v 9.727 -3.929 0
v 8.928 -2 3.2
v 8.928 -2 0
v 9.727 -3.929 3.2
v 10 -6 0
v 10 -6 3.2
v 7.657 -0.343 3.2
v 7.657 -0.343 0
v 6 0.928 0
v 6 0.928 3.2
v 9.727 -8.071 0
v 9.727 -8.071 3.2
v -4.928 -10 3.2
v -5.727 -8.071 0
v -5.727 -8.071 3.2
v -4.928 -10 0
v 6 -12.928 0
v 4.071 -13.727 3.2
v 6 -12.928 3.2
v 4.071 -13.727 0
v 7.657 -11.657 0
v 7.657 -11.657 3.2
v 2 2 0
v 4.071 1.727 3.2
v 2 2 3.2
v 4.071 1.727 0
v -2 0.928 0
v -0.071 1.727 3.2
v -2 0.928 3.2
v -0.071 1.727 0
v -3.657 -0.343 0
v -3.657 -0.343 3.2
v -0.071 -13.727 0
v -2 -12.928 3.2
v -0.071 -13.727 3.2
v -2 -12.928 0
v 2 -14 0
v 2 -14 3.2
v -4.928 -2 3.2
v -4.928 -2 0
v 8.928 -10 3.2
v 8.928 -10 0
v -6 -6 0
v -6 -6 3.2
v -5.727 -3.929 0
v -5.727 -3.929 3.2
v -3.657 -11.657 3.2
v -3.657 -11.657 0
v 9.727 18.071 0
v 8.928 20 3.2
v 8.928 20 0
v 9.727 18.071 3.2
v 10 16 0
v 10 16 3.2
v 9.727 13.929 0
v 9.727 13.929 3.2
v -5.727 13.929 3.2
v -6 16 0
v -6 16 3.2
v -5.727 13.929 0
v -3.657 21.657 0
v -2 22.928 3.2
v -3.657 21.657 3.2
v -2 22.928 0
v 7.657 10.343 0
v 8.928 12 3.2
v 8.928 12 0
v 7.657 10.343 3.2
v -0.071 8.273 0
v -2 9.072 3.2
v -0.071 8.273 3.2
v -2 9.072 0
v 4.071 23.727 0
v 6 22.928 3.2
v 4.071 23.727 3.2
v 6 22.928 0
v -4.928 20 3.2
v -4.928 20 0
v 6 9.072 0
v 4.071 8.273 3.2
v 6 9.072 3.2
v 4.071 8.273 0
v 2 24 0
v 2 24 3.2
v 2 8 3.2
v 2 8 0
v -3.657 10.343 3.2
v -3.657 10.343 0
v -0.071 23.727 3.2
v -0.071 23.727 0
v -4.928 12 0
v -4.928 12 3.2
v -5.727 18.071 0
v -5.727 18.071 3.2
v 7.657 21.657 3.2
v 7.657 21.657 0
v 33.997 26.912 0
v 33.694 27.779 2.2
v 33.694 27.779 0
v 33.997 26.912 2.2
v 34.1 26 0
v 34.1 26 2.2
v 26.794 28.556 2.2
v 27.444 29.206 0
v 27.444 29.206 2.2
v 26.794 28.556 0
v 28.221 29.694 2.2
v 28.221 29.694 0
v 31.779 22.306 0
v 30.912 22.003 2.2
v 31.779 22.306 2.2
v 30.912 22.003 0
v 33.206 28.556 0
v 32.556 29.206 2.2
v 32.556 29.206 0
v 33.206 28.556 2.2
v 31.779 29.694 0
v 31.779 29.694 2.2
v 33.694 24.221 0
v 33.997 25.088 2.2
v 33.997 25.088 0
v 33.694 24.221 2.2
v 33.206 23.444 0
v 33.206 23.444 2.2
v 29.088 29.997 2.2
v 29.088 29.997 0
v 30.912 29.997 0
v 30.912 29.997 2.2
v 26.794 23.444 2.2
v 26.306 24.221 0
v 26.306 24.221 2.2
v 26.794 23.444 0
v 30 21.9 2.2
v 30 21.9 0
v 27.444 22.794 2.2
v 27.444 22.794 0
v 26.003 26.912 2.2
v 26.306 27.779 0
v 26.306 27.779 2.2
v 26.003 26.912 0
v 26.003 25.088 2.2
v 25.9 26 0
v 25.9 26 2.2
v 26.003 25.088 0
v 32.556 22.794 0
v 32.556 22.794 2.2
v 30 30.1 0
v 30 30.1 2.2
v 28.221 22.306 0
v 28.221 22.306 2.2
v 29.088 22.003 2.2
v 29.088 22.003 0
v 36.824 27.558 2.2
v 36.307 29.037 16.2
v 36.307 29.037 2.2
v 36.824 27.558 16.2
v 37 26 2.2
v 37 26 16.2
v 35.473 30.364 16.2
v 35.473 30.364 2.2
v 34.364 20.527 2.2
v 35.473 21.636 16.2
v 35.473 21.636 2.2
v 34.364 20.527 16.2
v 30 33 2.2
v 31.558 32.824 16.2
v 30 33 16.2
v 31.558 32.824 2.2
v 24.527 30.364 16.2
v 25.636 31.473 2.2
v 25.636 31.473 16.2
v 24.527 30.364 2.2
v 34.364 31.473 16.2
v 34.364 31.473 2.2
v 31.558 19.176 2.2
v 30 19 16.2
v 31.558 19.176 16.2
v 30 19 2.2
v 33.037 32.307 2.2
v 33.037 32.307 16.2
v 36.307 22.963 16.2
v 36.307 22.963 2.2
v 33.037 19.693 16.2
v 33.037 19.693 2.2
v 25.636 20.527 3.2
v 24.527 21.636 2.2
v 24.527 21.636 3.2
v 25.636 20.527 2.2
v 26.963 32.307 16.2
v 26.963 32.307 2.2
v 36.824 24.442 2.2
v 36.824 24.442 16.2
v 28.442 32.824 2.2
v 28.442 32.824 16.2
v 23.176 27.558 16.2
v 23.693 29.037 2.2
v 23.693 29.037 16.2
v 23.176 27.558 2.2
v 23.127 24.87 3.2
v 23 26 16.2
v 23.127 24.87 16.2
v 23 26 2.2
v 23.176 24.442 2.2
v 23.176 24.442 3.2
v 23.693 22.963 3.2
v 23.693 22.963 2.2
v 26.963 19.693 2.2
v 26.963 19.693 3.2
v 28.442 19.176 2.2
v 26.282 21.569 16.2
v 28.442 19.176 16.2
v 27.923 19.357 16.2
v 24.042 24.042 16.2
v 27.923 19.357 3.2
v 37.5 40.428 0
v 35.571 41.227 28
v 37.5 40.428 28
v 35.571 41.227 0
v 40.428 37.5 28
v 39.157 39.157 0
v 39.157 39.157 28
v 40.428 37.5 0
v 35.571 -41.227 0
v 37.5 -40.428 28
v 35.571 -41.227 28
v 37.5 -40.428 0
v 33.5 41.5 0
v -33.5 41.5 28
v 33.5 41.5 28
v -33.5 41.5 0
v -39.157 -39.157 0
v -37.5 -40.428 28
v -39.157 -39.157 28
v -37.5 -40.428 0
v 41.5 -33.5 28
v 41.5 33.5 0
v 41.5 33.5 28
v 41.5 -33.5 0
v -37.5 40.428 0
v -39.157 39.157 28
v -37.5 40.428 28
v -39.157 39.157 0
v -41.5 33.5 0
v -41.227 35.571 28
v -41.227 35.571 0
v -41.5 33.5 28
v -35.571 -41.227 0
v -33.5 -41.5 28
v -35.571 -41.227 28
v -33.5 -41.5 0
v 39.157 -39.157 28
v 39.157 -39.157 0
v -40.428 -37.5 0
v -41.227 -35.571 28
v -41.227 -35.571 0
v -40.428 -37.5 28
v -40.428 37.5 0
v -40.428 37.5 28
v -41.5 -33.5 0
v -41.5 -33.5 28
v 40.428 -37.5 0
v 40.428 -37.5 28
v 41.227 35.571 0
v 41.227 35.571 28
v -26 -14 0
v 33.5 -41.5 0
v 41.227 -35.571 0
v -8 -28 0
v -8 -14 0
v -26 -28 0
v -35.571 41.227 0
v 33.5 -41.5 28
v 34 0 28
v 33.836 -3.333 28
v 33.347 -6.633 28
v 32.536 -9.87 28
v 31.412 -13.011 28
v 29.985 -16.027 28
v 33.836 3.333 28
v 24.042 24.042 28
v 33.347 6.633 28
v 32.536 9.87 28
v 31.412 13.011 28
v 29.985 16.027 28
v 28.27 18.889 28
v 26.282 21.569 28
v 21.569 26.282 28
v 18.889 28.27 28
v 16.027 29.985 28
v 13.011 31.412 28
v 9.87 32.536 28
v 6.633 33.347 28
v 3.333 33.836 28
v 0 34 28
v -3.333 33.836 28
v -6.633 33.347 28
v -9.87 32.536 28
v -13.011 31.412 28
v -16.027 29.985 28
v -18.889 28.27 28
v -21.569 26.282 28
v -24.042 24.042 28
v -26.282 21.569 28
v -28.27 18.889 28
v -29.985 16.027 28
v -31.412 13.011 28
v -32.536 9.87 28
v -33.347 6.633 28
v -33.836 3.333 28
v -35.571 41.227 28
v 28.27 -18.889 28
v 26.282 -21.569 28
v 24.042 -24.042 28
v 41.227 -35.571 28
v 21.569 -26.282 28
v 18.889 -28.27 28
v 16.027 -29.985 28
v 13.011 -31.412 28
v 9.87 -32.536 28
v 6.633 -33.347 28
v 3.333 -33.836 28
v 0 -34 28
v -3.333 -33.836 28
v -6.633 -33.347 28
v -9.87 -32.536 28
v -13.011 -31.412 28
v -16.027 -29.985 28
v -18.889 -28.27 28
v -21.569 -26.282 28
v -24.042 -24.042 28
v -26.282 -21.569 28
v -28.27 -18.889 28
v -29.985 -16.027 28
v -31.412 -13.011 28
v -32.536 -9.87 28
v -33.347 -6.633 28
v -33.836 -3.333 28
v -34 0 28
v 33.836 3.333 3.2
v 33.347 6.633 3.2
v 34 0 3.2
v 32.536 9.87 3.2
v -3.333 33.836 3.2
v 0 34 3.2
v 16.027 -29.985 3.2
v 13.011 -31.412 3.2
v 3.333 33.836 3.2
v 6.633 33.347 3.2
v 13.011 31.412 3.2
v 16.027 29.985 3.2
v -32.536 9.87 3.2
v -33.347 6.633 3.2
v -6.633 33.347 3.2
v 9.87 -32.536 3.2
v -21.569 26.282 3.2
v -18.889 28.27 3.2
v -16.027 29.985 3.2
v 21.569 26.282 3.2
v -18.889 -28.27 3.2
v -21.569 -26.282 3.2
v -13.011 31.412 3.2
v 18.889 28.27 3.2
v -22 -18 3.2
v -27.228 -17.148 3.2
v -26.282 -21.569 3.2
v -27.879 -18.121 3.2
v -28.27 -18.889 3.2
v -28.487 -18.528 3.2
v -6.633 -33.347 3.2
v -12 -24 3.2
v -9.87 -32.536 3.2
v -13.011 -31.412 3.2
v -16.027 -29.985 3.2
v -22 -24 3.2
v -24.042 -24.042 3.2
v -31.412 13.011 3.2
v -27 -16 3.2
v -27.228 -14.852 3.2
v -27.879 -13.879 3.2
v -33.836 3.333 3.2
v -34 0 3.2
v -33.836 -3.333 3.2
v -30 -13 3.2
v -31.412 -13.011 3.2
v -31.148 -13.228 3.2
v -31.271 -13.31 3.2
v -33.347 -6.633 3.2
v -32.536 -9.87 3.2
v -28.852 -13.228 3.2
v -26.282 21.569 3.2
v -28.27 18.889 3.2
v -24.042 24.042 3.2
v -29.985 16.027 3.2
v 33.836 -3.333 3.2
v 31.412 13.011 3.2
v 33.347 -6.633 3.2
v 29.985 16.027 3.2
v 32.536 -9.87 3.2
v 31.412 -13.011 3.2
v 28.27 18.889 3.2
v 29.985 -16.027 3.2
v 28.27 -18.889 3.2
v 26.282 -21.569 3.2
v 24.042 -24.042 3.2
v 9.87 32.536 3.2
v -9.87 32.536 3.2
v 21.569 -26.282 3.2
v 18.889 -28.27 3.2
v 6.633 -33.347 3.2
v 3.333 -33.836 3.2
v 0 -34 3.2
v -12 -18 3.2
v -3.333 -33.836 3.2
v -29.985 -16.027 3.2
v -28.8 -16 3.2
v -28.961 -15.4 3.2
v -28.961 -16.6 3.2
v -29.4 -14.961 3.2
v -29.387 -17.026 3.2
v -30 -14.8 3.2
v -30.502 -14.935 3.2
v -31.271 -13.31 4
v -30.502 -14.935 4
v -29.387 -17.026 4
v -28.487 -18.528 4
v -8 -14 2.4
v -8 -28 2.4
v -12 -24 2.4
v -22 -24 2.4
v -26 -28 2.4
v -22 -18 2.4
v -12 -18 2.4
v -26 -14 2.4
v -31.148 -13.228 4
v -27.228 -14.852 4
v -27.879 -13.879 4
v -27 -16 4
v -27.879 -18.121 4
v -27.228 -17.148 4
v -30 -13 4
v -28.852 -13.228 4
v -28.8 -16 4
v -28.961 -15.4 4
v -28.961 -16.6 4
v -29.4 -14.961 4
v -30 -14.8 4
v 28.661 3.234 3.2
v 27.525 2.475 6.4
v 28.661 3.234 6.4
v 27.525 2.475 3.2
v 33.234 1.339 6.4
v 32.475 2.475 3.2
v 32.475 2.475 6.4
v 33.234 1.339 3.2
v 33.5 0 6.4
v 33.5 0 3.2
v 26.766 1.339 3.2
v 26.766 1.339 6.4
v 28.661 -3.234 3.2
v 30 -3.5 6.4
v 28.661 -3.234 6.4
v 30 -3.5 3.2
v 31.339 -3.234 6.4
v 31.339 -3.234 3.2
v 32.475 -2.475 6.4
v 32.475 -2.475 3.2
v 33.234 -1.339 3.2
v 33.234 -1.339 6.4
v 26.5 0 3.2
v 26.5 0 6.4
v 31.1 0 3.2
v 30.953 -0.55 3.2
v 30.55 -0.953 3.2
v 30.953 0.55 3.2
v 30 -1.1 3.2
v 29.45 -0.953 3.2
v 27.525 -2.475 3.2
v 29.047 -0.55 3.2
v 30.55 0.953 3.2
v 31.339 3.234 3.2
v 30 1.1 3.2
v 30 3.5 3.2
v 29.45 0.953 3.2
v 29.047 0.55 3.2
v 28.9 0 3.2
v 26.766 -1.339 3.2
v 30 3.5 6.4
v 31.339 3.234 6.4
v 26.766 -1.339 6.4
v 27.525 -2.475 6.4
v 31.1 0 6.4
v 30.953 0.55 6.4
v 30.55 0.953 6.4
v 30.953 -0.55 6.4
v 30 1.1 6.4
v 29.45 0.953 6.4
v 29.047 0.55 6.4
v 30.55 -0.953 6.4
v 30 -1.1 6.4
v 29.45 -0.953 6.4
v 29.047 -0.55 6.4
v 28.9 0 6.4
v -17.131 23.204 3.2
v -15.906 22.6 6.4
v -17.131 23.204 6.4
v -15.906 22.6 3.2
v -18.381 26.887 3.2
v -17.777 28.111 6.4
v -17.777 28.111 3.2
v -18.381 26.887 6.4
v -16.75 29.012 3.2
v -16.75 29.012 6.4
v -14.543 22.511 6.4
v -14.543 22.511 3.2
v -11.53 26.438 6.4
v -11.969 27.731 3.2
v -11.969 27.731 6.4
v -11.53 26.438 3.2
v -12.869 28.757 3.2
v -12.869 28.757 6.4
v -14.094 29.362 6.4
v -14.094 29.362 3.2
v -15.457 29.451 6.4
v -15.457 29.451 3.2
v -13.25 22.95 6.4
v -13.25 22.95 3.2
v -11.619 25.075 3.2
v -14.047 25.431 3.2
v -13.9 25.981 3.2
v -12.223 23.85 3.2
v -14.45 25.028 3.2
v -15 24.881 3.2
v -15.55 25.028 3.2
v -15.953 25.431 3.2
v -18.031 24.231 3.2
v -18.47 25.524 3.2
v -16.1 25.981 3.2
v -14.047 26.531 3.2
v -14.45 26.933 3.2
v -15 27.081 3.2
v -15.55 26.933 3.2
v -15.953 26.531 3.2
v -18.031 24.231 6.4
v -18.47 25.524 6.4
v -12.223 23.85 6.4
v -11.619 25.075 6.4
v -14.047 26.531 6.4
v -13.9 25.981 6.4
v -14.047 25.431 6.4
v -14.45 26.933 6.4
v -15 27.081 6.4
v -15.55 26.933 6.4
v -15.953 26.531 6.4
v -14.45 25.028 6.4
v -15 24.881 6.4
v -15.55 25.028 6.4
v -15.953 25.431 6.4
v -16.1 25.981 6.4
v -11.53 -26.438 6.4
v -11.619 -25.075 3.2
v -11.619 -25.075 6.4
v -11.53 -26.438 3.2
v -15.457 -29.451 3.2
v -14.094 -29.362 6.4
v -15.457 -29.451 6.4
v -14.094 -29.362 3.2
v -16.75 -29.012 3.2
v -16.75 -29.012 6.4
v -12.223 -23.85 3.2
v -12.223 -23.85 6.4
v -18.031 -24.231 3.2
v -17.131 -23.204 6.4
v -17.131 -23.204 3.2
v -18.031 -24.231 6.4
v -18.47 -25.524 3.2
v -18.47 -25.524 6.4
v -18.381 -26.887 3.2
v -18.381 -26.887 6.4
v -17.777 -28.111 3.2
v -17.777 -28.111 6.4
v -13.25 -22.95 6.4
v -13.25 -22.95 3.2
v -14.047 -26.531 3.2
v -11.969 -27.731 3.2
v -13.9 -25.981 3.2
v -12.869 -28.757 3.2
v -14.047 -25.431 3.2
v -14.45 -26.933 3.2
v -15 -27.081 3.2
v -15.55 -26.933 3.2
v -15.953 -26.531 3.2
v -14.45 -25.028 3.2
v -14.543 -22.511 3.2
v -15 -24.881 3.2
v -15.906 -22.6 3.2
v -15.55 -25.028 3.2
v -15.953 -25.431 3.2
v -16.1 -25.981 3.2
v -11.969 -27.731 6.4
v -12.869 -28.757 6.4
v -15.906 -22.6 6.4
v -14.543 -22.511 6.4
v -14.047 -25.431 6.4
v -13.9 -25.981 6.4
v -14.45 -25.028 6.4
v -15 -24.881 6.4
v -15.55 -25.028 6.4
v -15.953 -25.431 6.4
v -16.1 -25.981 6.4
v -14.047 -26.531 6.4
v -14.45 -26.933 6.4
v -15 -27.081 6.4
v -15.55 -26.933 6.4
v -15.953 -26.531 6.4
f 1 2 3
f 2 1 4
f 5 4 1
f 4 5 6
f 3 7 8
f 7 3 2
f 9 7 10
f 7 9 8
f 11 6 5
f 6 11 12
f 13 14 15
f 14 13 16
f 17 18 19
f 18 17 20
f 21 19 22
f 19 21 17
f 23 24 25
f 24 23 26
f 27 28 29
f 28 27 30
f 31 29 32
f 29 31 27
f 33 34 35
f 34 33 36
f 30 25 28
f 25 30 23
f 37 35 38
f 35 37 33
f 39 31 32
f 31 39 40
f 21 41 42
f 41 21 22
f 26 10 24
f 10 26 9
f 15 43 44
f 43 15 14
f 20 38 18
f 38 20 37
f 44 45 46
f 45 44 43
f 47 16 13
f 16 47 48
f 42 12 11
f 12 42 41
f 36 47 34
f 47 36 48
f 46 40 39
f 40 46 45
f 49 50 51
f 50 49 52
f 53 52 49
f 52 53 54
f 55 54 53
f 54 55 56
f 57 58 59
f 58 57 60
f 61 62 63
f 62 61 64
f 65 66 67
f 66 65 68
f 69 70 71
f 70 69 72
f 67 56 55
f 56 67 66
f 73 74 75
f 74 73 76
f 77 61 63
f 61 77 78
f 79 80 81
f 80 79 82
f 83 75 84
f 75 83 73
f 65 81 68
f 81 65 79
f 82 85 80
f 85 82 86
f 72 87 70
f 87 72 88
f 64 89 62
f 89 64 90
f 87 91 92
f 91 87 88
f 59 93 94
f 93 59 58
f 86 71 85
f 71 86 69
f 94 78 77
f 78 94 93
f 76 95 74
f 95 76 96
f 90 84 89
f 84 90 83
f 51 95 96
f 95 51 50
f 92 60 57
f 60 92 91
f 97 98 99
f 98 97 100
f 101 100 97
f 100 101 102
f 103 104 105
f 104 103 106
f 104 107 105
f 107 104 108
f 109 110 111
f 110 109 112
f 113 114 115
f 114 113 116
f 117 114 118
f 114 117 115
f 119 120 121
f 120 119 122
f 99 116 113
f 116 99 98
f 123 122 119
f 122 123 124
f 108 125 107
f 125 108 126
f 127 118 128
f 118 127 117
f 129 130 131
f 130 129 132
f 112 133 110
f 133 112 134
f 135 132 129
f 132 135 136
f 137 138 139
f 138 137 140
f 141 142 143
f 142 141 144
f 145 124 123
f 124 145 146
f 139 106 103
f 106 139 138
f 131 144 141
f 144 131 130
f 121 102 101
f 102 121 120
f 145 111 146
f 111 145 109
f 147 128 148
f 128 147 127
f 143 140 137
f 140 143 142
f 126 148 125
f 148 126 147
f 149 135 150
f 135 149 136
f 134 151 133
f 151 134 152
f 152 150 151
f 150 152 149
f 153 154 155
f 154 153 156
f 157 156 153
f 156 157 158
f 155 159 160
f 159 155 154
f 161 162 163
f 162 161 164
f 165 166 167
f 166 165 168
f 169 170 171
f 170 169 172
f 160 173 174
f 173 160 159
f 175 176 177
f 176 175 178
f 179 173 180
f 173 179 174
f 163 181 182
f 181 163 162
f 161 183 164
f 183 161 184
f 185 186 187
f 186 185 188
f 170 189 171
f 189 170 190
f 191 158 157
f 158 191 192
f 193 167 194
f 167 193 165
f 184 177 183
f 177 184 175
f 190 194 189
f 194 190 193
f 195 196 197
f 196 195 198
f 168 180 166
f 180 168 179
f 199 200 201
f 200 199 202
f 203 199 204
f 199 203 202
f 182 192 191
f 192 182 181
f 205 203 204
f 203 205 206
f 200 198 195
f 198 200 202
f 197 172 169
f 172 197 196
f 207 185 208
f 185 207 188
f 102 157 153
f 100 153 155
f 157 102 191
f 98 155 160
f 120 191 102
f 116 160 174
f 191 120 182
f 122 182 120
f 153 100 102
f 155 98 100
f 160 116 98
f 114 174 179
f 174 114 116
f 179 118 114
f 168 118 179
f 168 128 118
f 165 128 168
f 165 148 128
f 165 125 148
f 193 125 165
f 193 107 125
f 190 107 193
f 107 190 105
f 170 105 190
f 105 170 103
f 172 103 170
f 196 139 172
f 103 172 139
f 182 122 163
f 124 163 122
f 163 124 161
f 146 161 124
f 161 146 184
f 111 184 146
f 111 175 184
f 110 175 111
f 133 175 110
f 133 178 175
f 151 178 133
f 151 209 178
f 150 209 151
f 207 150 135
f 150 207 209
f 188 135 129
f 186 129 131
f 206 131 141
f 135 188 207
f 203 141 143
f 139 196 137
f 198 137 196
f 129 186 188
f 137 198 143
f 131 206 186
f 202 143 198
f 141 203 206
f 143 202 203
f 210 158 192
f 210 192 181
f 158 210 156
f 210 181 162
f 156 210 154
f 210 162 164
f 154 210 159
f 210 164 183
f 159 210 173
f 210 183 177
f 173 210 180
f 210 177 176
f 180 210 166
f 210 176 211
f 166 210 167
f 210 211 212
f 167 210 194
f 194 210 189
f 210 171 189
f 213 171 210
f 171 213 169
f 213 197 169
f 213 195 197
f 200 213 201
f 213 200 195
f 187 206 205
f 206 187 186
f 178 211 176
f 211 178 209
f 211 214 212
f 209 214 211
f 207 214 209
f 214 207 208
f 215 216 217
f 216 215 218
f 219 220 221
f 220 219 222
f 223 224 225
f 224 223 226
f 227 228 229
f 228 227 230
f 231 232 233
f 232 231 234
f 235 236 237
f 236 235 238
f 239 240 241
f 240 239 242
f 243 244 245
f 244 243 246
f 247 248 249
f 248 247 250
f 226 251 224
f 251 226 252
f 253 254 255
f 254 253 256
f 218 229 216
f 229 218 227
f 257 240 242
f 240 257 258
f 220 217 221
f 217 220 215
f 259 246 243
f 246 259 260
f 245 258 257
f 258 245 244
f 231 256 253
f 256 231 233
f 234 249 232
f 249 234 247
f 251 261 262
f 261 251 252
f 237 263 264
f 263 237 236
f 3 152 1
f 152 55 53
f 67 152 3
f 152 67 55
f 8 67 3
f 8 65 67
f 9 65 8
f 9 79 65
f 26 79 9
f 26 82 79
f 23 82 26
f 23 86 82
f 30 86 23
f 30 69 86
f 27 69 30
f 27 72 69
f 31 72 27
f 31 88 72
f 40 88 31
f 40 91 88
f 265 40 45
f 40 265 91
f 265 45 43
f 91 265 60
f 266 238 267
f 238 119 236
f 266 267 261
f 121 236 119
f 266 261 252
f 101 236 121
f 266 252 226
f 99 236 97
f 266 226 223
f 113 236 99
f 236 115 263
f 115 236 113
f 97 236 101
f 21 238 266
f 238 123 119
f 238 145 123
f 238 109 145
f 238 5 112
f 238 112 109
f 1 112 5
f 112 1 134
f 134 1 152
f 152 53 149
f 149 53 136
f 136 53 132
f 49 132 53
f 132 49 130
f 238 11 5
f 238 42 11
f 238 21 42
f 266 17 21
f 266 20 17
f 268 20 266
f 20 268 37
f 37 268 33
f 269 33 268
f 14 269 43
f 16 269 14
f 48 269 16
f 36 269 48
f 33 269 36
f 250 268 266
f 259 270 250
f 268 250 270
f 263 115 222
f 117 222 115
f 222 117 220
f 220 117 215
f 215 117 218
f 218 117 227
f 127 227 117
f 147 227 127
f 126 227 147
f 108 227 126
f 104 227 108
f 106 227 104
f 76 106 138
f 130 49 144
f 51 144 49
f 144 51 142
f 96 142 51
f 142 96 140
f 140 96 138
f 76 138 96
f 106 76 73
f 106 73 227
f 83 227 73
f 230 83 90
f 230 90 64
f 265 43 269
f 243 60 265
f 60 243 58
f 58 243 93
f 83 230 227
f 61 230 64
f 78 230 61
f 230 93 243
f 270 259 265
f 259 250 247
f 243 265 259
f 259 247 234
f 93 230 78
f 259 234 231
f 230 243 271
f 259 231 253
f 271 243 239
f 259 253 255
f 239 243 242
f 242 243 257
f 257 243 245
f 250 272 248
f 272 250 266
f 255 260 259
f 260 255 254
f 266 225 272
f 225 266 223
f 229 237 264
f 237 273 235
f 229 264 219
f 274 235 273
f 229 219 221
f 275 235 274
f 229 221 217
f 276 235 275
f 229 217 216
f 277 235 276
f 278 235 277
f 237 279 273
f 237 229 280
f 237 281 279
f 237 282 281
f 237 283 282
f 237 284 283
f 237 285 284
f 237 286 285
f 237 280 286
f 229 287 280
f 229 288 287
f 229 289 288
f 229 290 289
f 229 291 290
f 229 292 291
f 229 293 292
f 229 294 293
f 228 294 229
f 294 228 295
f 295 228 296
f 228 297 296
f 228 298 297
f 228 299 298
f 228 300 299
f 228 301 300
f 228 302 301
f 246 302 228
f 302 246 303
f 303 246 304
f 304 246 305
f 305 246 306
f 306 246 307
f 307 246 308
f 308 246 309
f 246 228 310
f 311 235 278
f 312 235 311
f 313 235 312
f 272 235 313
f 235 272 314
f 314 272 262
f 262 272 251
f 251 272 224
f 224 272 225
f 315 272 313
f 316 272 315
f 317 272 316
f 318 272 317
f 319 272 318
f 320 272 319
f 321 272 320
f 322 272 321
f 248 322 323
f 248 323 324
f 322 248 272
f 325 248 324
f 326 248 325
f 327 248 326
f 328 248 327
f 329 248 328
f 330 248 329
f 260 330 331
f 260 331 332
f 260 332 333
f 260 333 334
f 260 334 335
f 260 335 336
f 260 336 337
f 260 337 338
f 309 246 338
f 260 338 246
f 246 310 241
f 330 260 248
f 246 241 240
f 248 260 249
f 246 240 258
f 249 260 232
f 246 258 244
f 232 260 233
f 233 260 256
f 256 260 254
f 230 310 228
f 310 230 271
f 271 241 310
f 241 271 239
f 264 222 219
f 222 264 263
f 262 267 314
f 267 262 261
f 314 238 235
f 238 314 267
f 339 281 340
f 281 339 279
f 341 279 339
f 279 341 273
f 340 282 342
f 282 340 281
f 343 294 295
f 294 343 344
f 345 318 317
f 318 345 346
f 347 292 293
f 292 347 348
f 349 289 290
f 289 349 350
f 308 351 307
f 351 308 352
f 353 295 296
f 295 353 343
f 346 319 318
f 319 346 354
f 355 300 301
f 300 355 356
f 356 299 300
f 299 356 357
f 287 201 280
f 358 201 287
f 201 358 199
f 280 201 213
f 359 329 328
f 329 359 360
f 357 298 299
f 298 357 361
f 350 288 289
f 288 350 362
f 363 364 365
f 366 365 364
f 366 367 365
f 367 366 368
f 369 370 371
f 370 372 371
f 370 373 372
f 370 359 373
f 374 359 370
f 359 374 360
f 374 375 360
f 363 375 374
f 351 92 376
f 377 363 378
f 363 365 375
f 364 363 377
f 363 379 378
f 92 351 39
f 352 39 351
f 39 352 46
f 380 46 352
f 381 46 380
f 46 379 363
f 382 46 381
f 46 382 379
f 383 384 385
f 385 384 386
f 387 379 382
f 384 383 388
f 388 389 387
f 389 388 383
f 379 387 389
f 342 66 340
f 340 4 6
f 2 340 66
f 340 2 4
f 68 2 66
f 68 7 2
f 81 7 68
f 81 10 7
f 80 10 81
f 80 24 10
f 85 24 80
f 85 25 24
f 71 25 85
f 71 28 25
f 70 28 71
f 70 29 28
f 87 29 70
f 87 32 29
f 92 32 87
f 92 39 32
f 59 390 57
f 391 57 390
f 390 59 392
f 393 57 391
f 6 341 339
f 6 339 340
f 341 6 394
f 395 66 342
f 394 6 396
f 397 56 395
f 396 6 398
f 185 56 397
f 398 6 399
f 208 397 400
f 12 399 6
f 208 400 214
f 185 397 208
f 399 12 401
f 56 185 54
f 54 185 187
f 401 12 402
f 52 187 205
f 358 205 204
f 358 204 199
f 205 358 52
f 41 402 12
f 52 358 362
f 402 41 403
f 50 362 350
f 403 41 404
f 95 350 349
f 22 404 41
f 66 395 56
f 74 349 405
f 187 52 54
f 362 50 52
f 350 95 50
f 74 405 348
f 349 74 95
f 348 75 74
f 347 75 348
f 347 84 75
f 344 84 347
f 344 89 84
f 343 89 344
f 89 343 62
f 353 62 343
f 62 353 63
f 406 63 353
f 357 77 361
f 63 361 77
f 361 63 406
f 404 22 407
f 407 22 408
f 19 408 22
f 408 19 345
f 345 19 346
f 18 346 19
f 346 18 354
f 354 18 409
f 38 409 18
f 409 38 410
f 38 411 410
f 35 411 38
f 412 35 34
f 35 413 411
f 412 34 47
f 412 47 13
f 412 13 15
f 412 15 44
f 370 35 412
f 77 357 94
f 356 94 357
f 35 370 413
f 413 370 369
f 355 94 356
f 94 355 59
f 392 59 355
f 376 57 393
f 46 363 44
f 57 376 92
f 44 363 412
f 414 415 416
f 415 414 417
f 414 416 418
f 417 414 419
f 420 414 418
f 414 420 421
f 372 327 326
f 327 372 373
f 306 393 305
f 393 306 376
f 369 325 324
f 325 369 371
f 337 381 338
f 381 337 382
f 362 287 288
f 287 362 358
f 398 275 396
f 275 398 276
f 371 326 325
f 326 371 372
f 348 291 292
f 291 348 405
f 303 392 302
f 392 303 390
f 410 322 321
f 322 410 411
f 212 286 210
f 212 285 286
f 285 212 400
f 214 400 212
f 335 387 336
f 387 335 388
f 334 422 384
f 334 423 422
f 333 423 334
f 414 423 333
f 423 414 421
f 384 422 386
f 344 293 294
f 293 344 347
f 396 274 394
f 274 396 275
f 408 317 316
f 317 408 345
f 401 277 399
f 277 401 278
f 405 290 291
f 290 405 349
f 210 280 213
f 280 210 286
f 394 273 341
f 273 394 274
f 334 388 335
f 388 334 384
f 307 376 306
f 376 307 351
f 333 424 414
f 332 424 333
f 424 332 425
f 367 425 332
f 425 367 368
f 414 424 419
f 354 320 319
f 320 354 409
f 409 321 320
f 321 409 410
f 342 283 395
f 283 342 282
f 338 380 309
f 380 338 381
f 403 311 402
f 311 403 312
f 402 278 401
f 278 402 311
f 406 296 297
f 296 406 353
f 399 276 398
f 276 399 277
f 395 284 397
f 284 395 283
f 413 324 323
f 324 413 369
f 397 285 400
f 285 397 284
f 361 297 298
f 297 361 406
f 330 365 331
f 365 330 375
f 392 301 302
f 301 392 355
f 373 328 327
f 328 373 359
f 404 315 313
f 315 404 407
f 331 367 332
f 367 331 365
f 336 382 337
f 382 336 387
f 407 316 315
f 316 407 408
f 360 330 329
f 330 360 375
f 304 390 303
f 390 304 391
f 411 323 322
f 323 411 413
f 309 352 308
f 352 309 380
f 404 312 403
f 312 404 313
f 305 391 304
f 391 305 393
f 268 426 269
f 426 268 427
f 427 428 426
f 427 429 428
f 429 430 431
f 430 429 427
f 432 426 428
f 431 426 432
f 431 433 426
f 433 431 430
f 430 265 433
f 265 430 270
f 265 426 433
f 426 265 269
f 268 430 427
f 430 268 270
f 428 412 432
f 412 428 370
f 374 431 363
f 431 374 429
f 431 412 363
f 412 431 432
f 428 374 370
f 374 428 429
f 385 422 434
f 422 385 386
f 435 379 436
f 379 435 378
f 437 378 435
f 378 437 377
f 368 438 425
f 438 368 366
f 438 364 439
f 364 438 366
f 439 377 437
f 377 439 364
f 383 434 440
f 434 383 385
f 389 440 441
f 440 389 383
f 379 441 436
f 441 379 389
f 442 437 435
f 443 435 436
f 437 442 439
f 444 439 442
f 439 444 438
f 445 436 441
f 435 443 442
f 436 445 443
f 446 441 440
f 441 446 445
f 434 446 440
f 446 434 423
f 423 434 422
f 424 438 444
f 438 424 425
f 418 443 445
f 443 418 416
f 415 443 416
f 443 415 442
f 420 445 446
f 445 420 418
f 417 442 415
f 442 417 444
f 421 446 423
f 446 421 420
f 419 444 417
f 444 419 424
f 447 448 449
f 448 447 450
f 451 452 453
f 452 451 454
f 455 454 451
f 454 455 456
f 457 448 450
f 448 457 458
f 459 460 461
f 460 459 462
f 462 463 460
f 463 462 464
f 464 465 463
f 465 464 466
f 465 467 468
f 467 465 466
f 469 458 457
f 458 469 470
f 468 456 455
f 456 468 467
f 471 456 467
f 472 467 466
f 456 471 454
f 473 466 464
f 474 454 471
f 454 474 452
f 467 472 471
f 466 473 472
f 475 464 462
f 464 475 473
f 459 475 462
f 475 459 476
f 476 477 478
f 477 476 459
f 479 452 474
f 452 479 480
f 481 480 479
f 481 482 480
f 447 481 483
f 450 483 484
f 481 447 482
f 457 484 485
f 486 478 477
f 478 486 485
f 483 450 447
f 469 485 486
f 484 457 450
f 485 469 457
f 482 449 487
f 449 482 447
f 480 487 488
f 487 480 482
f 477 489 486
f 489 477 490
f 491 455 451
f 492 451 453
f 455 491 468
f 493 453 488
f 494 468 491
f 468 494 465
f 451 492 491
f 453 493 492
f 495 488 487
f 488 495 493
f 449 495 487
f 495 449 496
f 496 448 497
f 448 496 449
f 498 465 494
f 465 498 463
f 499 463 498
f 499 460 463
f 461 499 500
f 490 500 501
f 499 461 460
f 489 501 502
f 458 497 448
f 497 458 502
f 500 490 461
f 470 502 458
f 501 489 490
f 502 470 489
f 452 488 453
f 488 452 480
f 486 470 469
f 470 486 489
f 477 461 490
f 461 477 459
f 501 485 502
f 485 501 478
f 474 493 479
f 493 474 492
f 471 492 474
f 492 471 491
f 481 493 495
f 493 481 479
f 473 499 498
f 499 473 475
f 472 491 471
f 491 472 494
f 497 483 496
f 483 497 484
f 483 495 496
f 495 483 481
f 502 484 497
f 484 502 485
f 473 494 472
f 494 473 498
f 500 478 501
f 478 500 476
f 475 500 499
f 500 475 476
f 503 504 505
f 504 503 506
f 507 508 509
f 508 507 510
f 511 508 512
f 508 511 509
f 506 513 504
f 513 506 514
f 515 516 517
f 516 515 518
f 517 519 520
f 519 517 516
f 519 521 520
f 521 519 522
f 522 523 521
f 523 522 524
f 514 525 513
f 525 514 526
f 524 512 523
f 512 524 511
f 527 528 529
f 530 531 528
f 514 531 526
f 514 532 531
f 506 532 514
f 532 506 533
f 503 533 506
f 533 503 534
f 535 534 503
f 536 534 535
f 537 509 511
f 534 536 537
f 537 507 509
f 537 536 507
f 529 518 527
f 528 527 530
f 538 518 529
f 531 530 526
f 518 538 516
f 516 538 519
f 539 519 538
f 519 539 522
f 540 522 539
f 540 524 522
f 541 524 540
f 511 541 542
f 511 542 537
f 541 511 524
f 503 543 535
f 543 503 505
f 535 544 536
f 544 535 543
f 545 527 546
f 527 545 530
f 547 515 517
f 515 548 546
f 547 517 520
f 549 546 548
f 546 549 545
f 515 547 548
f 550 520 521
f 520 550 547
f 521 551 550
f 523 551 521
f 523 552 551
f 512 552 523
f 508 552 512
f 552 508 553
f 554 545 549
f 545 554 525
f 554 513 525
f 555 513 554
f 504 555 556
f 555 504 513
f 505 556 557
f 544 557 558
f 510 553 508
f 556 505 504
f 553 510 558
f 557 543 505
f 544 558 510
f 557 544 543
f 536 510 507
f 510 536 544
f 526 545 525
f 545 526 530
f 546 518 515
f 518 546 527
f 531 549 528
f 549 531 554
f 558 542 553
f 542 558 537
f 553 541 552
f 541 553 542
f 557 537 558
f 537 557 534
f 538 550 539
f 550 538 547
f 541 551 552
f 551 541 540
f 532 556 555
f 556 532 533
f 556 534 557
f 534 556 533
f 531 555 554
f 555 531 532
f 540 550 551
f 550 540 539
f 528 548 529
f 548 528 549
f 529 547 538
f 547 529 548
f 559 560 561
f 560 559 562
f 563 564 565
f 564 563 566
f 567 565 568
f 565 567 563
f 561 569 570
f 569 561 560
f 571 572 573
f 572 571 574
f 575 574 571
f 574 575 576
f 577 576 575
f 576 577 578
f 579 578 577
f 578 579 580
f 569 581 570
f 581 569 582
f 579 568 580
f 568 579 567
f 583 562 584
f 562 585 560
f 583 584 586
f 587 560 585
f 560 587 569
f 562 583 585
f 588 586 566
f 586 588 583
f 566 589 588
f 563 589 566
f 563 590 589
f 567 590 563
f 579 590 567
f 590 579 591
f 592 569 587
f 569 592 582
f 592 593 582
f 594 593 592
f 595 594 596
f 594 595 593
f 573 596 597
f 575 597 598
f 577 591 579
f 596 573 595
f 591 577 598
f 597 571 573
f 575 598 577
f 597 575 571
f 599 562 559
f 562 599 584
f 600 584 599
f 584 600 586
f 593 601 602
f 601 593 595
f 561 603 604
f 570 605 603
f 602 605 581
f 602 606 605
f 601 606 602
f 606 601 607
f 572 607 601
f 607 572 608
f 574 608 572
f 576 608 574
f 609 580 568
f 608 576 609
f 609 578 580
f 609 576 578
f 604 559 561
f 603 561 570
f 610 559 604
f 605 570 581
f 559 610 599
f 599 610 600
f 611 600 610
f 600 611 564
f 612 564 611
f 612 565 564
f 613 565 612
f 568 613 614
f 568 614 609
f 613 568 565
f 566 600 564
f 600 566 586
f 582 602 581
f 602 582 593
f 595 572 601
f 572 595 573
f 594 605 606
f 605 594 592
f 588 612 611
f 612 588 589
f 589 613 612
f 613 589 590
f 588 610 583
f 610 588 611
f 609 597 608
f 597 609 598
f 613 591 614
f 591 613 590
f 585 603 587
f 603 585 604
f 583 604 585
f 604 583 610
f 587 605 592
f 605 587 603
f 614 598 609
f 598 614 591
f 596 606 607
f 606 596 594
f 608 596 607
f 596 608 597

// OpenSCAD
// Two outdoor variants that keep the AirGradient DIY three-part stack:
//   grill  — round bottom screen (original part A, ~72 mm)
//   base   — open ring the grill drops into (original part B, ~83 mm)
//   cover  — sleeve that slides over the ring (original part C, 91.5 x 86.7)
//
// The cover's lower opening is 84.2 mm so it slides over the 83 mm ring
// with about 0.6 mm per side, the same sleeve fit as the original.
//
//   openscad -o outdoor-flat/base.stl -D 'mode="flat"' -D 'part="base"' outdoor.scad
//
// mode: "flat" or "vertical"
// part: grill, base, cover

mode = "flat";
part = "base";

// Cover plan matches the published Open Air, 91.5 x 86.7 mm.
W = 91.5;
D = 86.7;
// Base ring, original part B is 83.0 x 82.9 x 26.7.
ring = 83.0;
ring_h = 28.0;
// Slide: cover inner opening over the ring.
slide_clear = 0.6;
slide_overlap = 16.0;
wall = 2.4;
rad = 8;

// Flat: +30 mm attic for a 22 mm pack under the lid.
// Vertical: +12 mm so a 70 mm pack plus a 4 mm PCM stands inside.
function cover_h() = mode == "flat" ? 112 : 94;

module rr(w, d, h, r) {
    hull() {
        for (x = [-1, 1], y = [-1, 1])
            translate([x * (w / 2 - r), y * (d / 2 - r), 0])
                cylinder(h = h, r = r, $fn = 24);
    }
}

module boss(h = 4.8) {
    difference() {
        cylinder(h = h, r = 3.0, $fn = 16);
        translate([0, 0, -0.2]) cylinder(h = h + 0.4, r = 1.15, $fn = 12);
    }
}

// Round grill, original part A. Sits on the ring lip.
module grill() {
    difference() {
        cylinder(h = 3.2, d = 70, $fn = 64);
        // Particle screen, clear of the USB pocket and the M8 hole.
        for (x = [-12, 0, 12], y = [-4, 8, 18])
            translate([x, y, -0.4]) cylinder(h = 4, d = 3.4, $fn = 12);
        // Three screws into the ring lip.
        for (a = [0, 120, 240])
            rotate([0, 0, a]) translate([30, 0, -0.4])
                cylinder(h = 4, d = 3.2, $fn = 12);
    }
}

module base() {
    difference() {
        rr(ring, ring, ring_h, rad);
        // Open centre. Lip at z=3.2 supports the grill.
        translate([0, 0, 3.2]) cylinder(h = ring_h, d = 68, $fn = 64);
        // PM ports through the ring floor, under the SPS30.
        for (y = [-6, 16])
            translate([2, y, -1]) cylinder(h = 6, d = 16, $fn = 24);
        // M8x1 female receptacle. 8.2 mm thread hole, 14 mm cup keep-out.
        translate([30, 26, -1]) {
            cylinder(h = 8, d = 8.2, $fn = 28);
            translate([0, 0, 3.2]) cylinder(h = 14, d = 14, $fn = 28);
        }
        // USB-C recess in the bottom face, opposite the M8 and clear of the
        // particle ports. The hole is smaller than the recess so the
        // connector sits up inside a drip lip.
        translate([-26, -28, -1]) cube([18, 14, 3.4], center = false);
        translate([-22, -24, -1]) cube([10, 6, 8], center = false);
    }
    // Optional cap boss beside the USB recess.
    translate([-30, -16, 0]) difference() {
        cylinder(h = 4, d = 6, $fn = 16);
        translate([0, 0, 1.6]) cylinder(h = 3, d = 2.4, $fn = 12);
    }
    // Grill screw bosses on the lip.
    for (a = [0, 120, 240])
        rotate([0, 0, a]) translate([30, 0, 3.2])
            difference() {
                cylinder(h = 3.2, d = 7, $fn = 16);
                translate([0, 0, -0.2]) cylinder(h = 4, d = 2.2, $fn = 12);
            }
}

module cover() {
    H = cover_h();
    difference() {
        rr(W, D, H, rad + 1);
        // Sleeve. The bottom opening is 84.2 mm across so it slides
        // over the 83 mm ring for slide_overlap millimetres.
        translate([0, 0, -0.2])
            rr(ring + 2 * slide_clear, ring + 2 * slide_clear, slide_overlap + 0.2, rad - 0.4);
        translate([0, 0, slide_overlap])
            rr(W - 2 * wall, D - 2 * wall, H, rad - 0.6);
        // Side exhaust, above the sleeve, opposite the USB wall.
        for (i = [0 : 3])
            translate([W / 2 - 3, -8 + i * 6, slide_overlap + 6])
                rotate([0, 90, 0]) cylinder(h = 8, d = 4, $fn = 12);
        // Intake louvers for the SHT45, front face.
        for (i = [0 : 3])
            translate([-10 + i * 7, D / 2 - 3, slide_overlap + 10])
                rotate([-90, 0, 0]) cylinder(h = 8, d = 4, $fn = 12);
    }
    // Standoffs for the sensor floor, measured from the top of the sleeve
    // once the cover is seated (the ring floor is below this).
    z0 = slide_overlap + 1;
    for (x = [-10, 14], y = [-8, 16])
        translate([x, y, z0]) boss();
    for (x = [-36, -16], y = [-2, 14])
        translate([x, y, z0]) boss();
    for (x = [-38, -24], y = [-8, 4])
        translate([x, y, z0 + 16]) boss();
    for (x = [8, 30], y = [16, 30])
        translate([x, y, z0 + 8]) boss();
    if (mode == "flat") {
        for (x = [-22, 22], y = [-14, 14])
            translate([x, y, H - 28]) boss(3.0);
        translate([-16, 28, z0 + 18]) cube([14, 2.4, 2]);
    } else {
        // Rails for the pack standing on the +X wall.
        translate([26, -30, z0 + 4]) cube([2.2, 24, 3]);
        translate([26, -30, z0 + 58]) cube([2.2, 24, 3]);
        translate([-16, 26, z0 + 18]) cube([14, 2.4, 2]);
    }
}

if (part == "grill") grill();
else if (part == "base") base();
else if (part == "cover") cover();
